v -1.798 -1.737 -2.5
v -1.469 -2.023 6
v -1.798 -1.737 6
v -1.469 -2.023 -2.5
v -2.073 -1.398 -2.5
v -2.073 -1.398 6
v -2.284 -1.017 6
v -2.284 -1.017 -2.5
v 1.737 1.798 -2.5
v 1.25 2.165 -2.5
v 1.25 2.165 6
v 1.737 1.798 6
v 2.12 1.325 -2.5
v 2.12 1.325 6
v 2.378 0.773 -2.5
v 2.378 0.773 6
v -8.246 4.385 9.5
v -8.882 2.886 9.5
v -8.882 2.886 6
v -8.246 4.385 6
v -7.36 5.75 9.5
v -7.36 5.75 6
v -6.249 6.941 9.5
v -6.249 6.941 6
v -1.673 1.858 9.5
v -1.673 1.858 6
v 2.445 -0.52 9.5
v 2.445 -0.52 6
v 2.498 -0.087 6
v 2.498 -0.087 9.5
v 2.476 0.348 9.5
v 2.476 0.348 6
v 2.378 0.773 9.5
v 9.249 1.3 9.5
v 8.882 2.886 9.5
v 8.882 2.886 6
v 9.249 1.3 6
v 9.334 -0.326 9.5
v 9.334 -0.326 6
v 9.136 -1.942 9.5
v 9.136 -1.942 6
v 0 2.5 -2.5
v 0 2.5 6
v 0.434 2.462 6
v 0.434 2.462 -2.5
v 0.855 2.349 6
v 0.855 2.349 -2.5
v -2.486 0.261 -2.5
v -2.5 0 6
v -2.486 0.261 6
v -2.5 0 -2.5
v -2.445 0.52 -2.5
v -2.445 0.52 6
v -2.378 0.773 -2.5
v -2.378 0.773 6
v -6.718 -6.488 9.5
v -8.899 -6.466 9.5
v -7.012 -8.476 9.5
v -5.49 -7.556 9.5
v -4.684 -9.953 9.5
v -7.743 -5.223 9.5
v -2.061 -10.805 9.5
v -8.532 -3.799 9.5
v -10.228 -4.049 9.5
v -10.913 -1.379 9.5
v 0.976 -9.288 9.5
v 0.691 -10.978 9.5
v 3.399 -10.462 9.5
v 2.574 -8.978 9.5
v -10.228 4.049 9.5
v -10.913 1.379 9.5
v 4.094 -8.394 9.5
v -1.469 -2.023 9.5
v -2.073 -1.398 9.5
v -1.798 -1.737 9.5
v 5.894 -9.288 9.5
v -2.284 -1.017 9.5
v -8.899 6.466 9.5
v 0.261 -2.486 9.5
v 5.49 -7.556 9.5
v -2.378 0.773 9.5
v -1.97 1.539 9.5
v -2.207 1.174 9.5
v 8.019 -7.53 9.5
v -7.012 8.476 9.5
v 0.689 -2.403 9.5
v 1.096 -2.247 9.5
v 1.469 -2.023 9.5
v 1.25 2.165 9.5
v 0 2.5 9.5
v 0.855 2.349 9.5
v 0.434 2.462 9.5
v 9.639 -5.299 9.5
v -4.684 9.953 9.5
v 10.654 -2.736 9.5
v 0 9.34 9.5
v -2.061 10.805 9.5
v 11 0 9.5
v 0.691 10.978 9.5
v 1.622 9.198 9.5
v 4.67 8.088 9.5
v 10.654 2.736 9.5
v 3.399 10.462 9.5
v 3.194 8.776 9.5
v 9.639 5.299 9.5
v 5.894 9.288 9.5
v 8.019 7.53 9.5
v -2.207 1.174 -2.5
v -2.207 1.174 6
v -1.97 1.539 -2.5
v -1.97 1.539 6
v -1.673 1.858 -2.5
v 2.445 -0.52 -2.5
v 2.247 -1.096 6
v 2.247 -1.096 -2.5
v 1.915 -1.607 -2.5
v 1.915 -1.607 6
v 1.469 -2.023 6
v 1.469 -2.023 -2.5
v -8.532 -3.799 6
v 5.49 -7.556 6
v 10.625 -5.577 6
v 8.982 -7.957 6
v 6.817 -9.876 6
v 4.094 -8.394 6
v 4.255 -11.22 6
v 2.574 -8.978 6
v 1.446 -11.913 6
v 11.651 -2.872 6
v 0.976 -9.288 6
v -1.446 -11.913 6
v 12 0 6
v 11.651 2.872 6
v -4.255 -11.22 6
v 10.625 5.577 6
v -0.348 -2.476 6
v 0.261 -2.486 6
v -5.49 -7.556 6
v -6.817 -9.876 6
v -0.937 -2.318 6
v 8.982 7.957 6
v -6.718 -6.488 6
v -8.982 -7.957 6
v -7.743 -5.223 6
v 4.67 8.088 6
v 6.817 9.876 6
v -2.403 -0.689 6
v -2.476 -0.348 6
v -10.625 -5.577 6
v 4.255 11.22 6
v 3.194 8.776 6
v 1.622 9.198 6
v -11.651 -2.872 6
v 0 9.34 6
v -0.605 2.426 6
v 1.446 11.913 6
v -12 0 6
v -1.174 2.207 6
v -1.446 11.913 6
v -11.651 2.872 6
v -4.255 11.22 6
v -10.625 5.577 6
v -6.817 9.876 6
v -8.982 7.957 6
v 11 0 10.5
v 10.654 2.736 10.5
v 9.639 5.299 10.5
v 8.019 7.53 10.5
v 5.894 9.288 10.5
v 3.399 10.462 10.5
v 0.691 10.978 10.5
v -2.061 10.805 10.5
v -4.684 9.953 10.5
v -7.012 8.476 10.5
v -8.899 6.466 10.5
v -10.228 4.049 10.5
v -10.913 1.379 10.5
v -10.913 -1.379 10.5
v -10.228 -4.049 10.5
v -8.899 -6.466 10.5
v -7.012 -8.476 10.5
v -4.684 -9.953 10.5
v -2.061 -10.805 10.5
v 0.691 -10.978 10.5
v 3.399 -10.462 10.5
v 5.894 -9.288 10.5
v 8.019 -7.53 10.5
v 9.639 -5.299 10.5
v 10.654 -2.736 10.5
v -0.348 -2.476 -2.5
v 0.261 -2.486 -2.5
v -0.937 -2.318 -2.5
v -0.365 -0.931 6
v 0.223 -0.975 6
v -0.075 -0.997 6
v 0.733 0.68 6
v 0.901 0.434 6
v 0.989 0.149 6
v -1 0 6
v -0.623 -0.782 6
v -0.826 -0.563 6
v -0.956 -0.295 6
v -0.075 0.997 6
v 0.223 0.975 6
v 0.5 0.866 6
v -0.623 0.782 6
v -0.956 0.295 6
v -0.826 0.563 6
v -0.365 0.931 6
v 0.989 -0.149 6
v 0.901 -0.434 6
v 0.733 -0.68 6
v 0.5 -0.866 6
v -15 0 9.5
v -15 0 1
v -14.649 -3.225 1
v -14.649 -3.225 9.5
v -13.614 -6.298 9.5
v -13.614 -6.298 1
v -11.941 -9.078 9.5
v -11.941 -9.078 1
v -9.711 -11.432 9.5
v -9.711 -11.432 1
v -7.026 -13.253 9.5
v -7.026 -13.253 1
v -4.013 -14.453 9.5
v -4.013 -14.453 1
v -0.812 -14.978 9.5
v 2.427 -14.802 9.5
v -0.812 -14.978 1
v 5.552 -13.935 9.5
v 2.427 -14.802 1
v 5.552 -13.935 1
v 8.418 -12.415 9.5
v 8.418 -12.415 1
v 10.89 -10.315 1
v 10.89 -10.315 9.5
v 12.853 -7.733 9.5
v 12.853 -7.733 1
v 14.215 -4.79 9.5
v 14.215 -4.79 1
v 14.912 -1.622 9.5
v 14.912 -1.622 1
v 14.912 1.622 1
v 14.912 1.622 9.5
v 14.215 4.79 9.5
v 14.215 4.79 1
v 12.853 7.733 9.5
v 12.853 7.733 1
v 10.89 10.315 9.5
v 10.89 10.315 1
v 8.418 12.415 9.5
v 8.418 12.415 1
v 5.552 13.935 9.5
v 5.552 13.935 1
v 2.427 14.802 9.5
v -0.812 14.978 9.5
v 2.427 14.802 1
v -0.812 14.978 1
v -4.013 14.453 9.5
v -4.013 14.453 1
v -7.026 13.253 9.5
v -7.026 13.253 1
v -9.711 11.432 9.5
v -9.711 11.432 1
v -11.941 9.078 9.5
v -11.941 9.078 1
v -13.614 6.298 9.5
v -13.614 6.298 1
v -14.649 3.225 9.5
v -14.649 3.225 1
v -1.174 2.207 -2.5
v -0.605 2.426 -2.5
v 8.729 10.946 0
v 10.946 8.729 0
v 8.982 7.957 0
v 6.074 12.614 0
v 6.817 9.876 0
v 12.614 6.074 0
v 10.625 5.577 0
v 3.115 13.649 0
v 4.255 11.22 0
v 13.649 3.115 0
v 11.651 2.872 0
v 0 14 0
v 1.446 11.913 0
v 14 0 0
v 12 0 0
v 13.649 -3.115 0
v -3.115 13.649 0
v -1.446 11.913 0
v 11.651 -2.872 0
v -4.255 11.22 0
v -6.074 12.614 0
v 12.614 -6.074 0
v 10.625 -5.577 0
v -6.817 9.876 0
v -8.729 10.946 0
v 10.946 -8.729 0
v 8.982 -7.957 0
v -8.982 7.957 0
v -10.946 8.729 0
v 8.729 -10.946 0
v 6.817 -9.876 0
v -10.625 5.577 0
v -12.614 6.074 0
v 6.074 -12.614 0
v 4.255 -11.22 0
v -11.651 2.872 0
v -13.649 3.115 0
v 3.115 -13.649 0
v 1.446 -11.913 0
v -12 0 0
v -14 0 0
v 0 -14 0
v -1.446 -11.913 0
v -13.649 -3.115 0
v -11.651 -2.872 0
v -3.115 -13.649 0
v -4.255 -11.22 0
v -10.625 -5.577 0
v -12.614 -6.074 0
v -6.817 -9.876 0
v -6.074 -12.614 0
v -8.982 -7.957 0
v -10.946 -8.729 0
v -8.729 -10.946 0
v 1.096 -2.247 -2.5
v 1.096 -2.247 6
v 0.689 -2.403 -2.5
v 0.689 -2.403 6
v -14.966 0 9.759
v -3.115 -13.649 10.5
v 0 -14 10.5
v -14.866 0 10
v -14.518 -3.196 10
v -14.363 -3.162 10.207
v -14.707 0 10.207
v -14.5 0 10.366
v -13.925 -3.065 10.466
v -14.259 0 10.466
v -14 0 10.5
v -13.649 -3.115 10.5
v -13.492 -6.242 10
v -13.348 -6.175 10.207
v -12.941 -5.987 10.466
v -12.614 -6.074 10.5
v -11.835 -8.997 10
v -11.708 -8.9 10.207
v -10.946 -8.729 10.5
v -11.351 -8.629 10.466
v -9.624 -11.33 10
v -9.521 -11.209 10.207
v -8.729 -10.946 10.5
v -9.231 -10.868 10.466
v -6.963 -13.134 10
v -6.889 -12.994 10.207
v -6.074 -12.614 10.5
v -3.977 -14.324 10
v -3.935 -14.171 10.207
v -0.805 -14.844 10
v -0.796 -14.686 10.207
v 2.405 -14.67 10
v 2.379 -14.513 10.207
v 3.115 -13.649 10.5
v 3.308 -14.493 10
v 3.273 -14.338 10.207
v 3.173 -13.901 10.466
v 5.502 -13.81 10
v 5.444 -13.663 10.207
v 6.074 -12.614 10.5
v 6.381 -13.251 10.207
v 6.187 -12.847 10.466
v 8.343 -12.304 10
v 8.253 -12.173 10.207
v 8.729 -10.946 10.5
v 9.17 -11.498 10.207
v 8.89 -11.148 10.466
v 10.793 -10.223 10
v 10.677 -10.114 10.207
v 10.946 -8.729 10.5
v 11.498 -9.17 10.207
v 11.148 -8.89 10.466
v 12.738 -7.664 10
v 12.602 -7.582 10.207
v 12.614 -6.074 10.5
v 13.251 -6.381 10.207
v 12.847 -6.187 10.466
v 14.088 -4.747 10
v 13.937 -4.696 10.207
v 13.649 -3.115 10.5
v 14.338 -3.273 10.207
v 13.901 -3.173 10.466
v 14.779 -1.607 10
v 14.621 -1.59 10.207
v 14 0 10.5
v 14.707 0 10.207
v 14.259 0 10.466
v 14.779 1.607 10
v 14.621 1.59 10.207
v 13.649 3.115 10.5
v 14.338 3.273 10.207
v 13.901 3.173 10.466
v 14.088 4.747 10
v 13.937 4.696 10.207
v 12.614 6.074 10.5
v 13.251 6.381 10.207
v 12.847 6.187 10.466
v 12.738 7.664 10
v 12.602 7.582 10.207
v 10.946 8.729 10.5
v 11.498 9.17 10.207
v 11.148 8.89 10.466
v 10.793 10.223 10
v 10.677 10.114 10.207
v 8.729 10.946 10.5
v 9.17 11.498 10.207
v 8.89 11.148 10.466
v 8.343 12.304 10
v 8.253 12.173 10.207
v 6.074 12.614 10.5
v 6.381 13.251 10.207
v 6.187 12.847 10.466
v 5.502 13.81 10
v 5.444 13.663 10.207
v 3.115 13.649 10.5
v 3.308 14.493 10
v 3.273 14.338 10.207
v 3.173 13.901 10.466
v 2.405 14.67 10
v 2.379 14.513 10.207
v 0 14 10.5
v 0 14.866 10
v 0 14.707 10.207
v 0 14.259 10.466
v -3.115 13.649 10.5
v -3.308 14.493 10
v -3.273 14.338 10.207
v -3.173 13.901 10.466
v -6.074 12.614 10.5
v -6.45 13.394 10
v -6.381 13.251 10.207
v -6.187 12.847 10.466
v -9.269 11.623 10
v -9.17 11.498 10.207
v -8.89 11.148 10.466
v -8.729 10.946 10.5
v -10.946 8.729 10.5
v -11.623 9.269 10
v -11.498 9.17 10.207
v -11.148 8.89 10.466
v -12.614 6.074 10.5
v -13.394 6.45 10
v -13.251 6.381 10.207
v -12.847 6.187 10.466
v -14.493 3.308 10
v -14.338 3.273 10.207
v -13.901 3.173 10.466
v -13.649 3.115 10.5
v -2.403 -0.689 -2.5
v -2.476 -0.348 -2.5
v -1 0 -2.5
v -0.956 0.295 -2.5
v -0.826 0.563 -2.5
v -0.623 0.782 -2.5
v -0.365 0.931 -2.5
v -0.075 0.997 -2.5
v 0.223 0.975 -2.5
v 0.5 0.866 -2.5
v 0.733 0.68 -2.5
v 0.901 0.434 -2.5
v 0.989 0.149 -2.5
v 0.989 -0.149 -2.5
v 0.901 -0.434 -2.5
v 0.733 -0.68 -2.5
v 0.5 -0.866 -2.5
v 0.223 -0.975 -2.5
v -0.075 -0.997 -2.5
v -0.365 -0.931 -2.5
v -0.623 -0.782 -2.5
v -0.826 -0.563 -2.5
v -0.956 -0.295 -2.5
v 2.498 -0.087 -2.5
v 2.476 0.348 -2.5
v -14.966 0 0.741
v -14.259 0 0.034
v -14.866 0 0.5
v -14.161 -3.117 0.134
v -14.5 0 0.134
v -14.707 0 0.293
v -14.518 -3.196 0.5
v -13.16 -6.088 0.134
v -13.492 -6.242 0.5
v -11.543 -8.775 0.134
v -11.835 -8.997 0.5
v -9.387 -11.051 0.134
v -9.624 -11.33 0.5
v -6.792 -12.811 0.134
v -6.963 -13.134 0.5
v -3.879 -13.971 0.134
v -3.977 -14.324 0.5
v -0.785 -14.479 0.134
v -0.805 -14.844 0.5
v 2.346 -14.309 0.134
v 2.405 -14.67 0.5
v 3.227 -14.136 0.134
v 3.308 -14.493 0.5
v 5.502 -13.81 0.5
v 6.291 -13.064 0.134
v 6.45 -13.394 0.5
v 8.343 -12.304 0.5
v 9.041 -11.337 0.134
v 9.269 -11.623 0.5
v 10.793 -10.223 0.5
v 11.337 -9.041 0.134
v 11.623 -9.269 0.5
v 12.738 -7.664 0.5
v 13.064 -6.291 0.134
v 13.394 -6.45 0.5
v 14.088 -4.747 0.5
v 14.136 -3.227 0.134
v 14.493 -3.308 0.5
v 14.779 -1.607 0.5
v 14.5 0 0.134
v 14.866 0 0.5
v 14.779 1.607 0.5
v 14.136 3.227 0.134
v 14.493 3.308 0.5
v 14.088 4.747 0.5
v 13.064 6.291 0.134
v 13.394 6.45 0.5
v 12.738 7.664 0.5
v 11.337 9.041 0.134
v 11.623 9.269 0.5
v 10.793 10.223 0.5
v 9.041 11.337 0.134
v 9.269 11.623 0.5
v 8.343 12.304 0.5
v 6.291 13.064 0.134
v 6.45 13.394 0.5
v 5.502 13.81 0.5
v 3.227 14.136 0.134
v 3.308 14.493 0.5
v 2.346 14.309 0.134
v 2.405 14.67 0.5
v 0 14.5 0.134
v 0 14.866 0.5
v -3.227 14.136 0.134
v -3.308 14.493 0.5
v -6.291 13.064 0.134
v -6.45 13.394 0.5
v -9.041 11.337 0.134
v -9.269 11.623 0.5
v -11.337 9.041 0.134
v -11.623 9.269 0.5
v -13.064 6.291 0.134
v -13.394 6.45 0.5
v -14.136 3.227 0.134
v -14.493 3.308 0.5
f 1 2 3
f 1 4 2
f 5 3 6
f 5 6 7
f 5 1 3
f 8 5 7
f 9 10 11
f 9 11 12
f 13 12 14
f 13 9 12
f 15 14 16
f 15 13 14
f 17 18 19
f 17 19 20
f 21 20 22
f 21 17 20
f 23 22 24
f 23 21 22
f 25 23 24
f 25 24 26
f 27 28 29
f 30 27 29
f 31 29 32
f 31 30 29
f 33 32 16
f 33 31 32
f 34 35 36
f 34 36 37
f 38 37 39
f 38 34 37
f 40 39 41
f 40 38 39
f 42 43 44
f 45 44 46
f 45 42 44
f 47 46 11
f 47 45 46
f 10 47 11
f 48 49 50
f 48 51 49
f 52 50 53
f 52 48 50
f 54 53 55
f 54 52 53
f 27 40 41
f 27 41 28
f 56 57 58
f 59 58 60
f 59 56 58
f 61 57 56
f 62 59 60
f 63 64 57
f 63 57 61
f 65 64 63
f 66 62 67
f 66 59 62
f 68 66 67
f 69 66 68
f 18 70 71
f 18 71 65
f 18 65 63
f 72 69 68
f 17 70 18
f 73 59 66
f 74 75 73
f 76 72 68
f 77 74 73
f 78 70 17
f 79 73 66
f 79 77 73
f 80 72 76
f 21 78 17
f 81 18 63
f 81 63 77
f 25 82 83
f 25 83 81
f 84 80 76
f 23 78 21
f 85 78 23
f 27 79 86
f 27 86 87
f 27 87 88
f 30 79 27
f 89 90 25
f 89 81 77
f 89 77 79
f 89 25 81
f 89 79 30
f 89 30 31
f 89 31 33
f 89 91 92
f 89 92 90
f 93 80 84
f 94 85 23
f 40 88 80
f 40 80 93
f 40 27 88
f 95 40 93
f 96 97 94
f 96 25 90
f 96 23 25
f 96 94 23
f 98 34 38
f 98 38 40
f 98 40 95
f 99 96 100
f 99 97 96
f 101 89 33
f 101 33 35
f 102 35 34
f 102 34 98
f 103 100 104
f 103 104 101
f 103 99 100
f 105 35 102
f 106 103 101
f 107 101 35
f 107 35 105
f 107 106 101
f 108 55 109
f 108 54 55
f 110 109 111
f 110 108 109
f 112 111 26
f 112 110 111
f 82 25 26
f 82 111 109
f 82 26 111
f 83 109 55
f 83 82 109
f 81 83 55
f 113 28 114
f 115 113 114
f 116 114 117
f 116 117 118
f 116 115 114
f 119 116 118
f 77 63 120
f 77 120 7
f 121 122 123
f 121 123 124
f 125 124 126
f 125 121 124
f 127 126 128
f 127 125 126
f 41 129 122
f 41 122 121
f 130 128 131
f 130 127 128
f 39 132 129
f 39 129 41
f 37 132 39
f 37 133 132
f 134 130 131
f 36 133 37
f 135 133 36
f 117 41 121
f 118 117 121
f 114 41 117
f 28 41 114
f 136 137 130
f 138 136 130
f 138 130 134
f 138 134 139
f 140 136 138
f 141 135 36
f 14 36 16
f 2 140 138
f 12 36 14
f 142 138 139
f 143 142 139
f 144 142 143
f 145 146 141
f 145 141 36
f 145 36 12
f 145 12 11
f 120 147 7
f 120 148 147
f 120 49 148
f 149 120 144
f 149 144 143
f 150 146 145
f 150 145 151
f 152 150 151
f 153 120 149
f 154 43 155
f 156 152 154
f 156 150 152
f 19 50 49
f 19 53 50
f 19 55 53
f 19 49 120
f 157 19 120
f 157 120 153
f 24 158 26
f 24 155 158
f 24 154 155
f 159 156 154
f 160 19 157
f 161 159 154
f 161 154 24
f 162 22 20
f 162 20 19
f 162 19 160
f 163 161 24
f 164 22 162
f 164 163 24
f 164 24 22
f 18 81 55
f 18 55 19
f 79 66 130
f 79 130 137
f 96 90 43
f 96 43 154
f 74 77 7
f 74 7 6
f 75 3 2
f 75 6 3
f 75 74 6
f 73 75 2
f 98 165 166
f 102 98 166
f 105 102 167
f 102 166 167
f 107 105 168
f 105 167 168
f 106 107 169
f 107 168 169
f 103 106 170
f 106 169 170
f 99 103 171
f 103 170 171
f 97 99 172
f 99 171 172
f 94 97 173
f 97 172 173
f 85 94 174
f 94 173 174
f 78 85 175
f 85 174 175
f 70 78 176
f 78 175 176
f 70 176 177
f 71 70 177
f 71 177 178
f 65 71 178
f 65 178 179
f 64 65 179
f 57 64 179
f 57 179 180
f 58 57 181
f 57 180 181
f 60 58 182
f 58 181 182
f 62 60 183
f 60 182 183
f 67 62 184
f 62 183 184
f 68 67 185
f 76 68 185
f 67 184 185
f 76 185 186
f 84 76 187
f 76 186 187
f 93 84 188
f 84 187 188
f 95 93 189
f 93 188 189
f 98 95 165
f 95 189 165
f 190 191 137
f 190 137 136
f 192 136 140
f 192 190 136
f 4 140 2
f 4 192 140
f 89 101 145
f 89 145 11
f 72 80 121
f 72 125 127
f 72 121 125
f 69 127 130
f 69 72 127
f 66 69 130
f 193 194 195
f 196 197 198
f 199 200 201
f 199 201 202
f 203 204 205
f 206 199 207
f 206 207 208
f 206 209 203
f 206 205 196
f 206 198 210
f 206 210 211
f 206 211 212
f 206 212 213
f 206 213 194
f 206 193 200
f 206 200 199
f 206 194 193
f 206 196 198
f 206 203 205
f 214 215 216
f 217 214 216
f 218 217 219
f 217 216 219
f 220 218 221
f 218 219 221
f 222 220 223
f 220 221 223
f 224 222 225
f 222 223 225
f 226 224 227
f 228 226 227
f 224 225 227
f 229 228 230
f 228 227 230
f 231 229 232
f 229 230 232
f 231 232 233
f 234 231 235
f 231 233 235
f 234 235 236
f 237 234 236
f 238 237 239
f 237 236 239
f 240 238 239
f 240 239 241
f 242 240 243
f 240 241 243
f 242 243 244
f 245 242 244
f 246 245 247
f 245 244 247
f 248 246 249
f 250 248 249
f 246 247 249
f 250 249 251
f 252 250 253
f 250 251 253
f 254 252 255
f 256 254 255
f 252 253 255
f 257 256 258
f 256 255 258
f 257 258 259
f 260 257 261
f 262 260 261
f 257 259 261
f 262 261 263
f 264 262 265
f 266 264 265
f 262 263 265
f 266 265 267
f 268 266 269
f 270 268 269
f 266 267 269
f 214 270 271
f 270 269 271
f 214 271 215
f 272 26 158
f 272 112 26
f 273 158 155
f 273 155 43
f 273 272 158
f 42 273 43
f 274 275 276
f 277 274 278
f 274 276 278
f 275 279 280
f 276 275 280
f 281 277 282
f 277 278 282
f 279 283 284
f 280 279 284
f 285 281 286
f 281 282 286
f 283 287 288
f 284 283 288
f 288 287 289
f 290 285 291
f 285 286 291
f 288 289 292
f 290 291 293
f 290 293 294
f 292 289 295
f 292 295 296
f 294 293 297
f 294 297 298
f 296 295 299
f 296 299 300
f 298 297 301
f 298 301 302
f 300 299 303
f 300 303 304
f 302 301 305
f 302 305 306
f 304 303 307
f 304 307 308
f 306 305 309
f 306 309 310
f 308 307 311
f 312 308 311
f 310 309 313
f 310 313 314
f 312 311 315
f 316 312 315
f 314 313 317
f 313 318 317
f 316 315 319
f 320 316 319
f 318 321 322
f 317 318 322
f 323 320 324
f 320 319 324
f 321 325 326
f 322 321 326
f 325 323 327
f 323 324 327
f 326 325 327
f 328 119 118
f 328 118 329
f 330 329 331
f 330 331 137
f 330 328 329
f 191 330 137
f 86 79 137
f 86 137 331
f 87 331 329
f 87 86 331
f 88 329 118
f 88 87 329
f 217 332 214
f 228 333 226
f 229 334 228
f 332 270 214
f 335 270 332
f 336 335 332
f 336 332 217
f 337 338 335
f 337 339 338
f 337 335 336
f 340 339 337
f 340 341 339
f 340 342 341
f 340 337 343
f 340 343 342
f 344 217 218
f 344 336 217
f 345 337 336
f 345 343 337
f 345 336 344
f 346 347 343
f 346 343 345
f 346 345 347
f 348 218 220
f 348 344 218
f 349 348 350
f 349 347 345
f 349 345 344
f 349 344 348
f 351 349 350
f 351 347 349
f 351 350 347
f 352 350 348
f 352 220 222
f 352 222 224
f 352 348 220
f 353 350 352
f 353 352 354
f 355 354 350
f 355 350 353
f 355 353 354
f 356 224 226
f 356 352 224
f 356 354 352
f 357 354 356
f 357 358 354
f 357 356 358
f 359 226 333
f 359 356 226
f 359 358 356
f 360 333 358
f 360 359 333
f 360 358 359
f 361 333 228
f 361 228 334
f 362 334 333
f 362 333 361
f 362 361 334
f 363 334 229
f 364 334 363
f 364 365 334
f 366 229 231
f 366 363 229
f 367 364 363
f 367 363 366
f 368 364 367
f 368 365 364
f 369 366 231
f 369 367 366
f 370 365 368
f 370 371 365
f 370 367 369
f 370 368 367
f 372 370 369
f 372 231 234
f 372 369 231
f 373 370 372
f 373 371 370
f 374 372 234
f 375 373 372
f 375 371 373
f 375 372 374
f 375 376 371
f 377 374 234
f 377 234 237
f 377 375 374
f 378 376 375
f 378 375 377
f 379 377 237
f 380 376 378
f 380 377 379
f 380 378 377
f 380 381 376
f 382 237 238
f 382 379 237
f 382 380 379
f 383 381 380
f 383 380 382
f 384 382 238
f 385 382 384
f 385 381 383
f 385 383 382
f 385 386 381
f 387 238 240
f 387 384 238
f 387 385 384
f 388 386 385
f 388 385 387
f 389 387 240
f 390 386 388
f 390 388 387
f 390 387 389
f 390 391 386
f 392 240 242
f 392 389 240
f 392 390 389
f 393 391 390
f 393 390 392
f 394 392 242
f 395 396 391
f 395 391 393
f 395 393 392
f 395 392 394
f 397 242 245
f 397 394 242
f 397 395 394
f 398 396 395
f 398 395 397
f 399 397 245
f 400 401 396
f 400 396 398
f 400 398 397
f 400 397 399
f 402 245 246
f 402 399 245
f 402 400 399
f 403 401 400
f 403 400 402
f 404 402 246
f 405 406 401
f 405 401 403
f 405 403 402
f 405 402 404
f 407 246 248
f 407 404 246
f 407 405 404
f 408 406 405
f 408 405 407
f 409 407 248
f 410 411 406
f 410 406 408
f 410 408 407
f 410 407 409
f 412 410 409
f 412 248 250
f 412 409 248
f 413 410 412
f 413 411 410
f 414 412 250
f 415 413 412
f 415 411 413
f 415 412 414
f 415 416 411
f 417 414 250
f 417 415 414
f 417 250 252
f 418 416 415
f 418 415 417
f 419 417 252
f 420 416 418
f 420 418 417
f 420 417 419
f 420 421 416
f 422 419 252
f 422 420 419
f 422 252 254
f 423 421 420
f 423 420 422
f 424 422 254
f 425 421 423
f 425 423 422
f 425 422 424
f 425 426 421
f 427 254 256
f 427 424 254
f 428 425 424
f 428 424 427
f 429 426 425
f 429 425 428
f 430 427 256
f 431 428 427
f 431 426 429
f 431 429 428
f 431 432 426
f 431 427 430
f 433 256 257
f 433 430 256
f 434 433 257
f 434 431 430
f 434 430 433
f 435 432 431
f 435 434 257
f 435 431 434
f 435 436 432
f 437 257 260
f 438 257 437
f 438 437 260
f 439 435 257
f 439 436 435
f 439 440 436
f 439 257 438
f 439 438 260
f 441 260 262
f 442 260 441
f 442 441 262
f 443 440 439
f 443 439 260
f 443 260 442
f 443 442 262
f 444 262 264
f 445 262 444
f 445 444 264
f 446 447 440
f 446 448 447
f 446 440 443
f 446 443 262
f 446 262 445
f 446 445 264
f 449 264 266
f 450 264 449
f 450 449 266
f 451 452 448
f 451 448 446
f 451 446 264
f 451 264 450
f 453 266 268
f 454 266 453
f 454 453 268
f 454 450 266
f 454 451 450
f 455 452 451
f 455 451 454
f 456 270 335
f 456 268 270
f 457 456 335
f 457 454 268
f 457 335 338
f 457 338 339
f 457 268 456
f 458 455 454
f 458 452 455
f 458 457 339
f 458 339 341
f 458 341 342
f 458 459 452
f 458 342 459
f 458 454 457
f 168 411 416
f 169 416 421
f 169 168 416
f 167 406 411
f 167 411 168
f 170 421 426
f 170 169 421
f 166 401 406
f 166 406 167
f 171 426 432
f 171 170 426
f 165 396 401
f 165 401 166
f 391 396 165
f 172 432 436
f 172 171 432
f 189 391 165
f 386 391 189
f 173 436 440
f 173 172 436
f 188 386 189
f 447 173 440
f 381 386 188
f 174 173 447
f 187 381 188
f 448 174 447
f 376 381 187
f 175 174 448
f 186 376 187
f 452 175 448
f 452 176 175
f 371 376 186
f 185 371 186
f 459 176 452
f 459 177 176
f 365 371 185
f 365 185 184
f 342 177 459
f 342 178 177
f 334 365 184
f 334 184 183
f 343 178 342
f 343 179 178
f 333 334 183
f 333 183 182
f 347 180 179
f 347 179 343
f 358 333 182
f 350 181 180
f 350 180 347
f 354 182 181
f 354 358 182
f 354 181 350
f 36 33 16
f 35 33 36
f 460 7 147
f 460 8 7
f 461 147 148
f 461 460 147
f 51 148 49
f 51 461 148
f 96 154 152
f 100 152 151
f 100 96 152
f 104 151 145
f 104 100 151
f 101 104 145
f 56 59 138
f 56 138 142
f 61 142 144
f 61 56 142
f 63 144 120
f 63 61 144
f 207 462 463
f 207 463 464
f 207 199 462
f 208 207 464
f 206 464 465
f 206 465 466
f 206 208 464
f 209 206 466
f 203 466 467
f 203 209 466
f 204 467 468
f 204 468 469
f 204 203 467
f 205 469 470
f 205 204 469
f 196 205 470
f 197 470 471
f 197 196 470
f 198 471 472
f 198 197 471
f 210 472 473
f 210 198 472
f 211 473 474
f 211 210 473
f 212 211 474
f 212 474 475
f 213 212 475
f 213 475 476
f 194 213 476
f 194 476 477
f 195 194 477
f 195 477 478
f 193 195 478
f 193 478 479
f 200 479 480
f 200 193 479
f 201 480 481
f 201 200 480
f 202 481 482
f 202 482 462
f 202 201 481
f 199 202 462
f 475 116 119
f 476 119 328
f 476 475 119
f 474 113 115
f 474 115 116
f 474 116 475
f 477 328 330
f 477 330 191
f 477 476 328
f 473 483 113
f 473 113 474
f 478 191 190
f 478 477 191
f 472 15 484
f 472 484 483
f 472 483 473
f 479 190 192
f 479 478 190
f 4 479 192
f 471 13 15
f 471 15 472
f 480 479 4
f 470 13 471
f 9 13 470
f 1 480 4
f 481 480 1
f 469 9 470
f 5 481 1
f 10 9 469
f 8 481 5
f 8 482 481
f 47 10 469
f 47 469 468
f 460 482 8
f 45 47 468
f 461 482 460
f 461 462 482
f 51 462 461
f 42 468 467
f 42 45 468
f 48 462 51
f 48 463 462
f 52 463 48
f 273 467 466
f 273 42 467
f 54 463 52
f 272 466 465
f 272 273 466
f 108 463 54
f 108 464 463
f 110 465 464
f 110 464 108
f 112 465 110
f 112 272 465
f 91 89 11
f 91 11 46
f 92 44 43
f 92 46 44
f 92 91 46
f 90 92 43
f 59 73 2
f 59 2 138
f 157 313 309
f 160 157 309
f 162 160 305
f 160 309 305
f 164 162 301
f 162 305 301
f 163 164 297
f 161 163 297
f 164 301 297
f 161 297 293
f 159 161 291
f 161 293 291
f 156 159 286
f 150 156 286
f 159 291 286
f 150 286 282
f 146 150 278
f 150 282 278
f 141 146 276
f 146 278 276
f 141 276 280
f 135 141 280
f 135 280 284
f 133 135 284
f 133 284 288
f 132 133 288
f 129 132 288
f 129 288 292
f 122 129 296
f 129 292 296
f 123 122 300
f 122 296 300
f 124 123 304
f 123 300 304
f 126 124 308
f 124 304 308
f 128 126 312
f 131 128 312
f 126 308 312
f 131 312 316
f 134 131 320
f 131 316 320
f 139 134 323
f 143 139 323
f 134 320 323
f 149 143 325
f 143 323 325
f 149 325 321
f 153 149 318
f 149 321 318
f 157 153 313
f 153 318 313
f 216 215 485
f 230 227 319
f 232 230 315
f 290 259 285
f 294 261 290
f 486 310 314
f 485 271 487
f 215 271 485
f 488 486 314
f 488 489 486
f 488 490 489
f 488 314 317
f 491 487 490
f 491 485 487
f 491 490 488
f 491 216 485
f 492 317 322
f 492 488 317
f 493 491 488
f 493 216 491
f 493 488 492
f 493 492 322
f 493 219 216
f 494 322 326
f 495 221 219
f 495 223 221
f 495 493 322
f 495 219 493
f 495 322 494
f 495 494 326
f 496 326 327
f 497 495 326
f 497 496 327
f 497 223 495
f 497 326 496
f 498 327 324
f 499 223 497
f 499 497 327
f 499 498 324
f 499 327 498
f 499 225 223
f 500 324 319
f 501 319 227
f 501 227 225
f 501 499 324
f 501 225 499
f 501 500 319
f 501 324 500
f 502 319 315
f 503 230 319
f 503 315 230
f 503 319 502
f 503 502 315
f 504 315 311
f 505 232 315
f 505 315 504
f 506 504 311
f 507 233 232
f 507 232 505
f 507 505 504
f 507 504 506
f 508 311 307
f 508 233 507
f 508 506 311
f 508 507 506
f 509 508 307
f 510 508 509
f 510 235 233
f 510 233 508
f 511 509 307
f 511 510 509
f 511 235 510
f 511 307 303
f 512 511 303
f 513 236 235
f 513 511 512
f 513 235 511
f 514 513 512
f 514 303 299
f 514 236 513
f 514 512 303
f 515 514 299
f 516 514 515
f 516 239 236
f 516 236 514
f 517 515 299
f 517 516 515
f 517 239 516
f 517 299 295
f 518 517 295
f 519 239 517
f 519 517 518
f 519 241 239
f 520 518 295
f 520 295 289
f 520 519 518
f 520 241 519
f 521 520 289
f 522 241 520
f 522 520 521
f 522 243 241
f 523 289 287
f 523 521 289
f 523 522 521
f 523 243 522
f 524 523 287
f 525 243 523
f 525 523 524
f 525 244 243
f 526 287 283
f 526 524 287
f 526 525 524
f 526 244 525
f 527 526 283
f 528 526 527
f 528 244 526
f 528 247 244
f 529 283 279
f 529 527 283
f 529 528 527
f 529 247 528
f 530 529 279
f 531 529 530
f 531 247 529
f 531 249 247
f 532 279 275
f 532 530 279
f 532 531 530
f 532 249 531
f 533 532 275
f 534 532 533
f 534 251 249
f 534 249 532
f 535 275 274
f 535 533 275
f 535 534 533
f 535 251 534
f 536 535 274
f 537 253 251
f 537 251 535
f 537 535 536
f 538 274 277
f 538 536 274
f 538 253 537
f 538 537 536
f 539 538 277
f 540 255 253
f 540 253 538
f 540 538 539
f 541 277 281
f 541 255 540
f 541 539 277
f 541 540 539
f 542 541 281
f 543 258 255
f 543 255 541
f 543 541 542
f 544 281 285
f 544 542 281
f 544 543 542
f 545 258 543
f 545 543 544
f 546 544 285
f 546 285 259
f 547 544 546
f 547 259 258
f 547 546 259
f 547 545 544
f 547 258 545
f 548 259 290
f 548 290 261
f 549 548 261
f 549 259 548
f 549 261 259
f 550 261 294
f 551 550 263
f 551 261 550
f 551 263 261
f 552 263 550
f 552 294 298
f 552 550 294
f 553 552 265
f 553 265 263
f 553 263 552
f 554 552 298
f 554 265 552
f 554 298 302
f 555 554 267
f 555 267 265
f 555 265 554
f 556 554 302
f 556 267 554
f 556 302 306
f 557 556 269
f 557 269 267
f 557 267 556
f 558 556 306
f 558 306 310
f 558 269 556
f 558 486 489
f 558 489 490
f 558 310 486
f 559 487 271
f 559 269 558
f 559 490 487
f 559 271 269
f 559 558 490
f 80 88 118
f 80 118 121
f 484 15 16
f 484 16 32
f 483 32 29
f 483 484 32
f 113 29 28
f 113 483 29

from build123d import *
from build123d.topology import SkipClean

# Parameters (mm, degrees)
SKETCH1_R           = 15
BOSS_EXTRUDE1_DEPTH = 10.5
SKETCH2_R           = 11
CUT_EXTRUDE1_DEPTH  = 1
SKETCH3_R           = 12
SKETCH3_R_2         = 2.5
SKETCH3_R_3         = 1
CUT_EXTRUDE2_DEPTH  = 6
BOSS_EXTRUDE2_START = 2.5
SKETCH3_4_R         = 2.5
SKETCH3_4_R_2       = 1
BOSS_EXTRUDE2_DEPTH = 2.5
FILLET1_R           = 1
CUT_EXTRUDE3_DEPTH  = 25.372115214


with BuildPart() as part:
    # Sketch1 → Boss-Extrude1 (new body)
    with BuildSketch(Plane.XY):
        Circle(SKETCH1_R)
    extrude(amount=BOSS_EXTRUDE1_DEPTH)

    # Sketch2 → Cut-Extrude1 (cut)
    with BuildSketch(Plane.XY.offset(10.5)):
        Circle(SKETCH2_R)
    extrude(amount=-CUT_EXTRUDE1_DEPTH, mode=Mode.SUBTRACT)

    # Sketch3 → Cut-Extrude2 (cut)
    # profile 1 of 2: a face of its own
    with BuildSketch(Plane(origin=(0, 0, 0), x_dir=(-1, 0, 0), z_dir=(0, 0, -1))):
        Circle(SKETCH3_R)
        Circle(SKETCH3_R_2, mode=Mode.SUBTRACT)
    # profile 2 of 2: a face of its own
    with BuildSketch(Plane(origin=(0, 0, 0), x_dir=(-1, 0, 0), z_dir=(0, 0, -1))):
        Circle(SKETCH3_R_3)
    extrude(amount=-CUT_EXTRUDE2_DEPTH, mode=Mode.SUBTRACT)

    # Sketch3<4> → Boss-Extrude2 (add)
    with BuildSketch(Plane(origin=(0, 0, 0), x_dir=(-1, 0, 0), z_dir=(0, 0, -1)).offset(BOSS_EXTRUDE2_START)):
        Circle(SKETCH3_4_R)
        Circle(SKETCH3_4_R_2, mode=Mode.SUBTRACT)
    extrude(amount=-BOSS_EXTRUDE2_DEPTH)

    # Fillet1
    fillet1_edges = [part.edges().sort_by_distance(p)[0] for p in [
        (-15, 0, 0),
        (-15, 0, 10.5),
    ]]
    fillet(fillet1_edges, radius=FILLET1_R)

    # Sketch4 → Cut-Extrude3 (cut, through all)
    with SkipClean():  # the faces are left unmerged after this step: merging them gives an invalid solid
        with BuildSketch(Plane.XY.offset(9.5)):
            with BuildLine():
                Line((0, 2.5), (0, 9.339610027))
                ThreePointArc((0, 9.339610027), (2.417268949, 9.021370532), (4.669805013, 8.088339545))
                Line((4.669805013, 8.088339545), (1.25, 2.165063509))
                ThreePointArc((1.25, 2.165063509), (0.647047613, 2.414814566), (0, 2.5))
            make_face()
            with BuildLine():
                Line((2.377641291, 0.772542486), (8.882496976, 2.886098219))
                ThreePointArc((8.882496976, 2.886098219), (9.326810416, 0.488797422), (9.135517139, -1.941814112))
                Line((9.135517139, -1.941814112), (2.445369002, -0.519779227))
                ThreePointArc((2.445369002, -0.519779227), (2.496573837, 0.130839891), (2.377641291, 0.772542486))
            make_face()
            with BuildLine():
                Line((1.469463131, -2.022542486), (5.489685036, -7.555903232))
                ThreePointArc((5.489685036, -7.555903232), (3.347016895, -8.719277112), (0.976255084, -9.288446666))
                Line((0.976255084, -9.288446666), (0.261321158, -2.486304738))
                ThreePointArc((0.261321158, -2.486304738), (0.895919874, -2.333951066), (1.469463131, -2.022542486))
            make_face()
            with BuildLine():
                Line((-1.469463131, -2.022542486), (-5.489685036, -7.555903232))
                ThreePointArc((-5.489685036, -7.555903232), (-7.258240214, -5.877607034), (-8.532158316, -3.79876163))
                Line((-8.532158316, -3.79876163), (-2.283863644, -1.016841608))
                ThreePointArc((-2.283863644, -1.016841608), (-1.942864904, -1.573300978), (-1.469463131, -2.022542486))
            make_face()
            with BuildLine():
                Line((-2.377641291, 0.772542486), (-8.882496976, 2.886098219))
                ThreePointArc((-8.882496976, 2.886098219), (-7.832856045, 5.086716192), (-6.24941892, 6.940682863))
                Line((-6.24941892, 6.940682863), (-1.672826516, 1.857862064))
                ThreePointArc((-1.672826516, 1.857862064), (-2.09667642, 1.361597588), (-2.377641291, 0.772542486))
            make_face()
        extrude(amount=-CUT_EXTRUDE3_DEPTH, mode=Mode.SUBTRACT)


solid = part.part
